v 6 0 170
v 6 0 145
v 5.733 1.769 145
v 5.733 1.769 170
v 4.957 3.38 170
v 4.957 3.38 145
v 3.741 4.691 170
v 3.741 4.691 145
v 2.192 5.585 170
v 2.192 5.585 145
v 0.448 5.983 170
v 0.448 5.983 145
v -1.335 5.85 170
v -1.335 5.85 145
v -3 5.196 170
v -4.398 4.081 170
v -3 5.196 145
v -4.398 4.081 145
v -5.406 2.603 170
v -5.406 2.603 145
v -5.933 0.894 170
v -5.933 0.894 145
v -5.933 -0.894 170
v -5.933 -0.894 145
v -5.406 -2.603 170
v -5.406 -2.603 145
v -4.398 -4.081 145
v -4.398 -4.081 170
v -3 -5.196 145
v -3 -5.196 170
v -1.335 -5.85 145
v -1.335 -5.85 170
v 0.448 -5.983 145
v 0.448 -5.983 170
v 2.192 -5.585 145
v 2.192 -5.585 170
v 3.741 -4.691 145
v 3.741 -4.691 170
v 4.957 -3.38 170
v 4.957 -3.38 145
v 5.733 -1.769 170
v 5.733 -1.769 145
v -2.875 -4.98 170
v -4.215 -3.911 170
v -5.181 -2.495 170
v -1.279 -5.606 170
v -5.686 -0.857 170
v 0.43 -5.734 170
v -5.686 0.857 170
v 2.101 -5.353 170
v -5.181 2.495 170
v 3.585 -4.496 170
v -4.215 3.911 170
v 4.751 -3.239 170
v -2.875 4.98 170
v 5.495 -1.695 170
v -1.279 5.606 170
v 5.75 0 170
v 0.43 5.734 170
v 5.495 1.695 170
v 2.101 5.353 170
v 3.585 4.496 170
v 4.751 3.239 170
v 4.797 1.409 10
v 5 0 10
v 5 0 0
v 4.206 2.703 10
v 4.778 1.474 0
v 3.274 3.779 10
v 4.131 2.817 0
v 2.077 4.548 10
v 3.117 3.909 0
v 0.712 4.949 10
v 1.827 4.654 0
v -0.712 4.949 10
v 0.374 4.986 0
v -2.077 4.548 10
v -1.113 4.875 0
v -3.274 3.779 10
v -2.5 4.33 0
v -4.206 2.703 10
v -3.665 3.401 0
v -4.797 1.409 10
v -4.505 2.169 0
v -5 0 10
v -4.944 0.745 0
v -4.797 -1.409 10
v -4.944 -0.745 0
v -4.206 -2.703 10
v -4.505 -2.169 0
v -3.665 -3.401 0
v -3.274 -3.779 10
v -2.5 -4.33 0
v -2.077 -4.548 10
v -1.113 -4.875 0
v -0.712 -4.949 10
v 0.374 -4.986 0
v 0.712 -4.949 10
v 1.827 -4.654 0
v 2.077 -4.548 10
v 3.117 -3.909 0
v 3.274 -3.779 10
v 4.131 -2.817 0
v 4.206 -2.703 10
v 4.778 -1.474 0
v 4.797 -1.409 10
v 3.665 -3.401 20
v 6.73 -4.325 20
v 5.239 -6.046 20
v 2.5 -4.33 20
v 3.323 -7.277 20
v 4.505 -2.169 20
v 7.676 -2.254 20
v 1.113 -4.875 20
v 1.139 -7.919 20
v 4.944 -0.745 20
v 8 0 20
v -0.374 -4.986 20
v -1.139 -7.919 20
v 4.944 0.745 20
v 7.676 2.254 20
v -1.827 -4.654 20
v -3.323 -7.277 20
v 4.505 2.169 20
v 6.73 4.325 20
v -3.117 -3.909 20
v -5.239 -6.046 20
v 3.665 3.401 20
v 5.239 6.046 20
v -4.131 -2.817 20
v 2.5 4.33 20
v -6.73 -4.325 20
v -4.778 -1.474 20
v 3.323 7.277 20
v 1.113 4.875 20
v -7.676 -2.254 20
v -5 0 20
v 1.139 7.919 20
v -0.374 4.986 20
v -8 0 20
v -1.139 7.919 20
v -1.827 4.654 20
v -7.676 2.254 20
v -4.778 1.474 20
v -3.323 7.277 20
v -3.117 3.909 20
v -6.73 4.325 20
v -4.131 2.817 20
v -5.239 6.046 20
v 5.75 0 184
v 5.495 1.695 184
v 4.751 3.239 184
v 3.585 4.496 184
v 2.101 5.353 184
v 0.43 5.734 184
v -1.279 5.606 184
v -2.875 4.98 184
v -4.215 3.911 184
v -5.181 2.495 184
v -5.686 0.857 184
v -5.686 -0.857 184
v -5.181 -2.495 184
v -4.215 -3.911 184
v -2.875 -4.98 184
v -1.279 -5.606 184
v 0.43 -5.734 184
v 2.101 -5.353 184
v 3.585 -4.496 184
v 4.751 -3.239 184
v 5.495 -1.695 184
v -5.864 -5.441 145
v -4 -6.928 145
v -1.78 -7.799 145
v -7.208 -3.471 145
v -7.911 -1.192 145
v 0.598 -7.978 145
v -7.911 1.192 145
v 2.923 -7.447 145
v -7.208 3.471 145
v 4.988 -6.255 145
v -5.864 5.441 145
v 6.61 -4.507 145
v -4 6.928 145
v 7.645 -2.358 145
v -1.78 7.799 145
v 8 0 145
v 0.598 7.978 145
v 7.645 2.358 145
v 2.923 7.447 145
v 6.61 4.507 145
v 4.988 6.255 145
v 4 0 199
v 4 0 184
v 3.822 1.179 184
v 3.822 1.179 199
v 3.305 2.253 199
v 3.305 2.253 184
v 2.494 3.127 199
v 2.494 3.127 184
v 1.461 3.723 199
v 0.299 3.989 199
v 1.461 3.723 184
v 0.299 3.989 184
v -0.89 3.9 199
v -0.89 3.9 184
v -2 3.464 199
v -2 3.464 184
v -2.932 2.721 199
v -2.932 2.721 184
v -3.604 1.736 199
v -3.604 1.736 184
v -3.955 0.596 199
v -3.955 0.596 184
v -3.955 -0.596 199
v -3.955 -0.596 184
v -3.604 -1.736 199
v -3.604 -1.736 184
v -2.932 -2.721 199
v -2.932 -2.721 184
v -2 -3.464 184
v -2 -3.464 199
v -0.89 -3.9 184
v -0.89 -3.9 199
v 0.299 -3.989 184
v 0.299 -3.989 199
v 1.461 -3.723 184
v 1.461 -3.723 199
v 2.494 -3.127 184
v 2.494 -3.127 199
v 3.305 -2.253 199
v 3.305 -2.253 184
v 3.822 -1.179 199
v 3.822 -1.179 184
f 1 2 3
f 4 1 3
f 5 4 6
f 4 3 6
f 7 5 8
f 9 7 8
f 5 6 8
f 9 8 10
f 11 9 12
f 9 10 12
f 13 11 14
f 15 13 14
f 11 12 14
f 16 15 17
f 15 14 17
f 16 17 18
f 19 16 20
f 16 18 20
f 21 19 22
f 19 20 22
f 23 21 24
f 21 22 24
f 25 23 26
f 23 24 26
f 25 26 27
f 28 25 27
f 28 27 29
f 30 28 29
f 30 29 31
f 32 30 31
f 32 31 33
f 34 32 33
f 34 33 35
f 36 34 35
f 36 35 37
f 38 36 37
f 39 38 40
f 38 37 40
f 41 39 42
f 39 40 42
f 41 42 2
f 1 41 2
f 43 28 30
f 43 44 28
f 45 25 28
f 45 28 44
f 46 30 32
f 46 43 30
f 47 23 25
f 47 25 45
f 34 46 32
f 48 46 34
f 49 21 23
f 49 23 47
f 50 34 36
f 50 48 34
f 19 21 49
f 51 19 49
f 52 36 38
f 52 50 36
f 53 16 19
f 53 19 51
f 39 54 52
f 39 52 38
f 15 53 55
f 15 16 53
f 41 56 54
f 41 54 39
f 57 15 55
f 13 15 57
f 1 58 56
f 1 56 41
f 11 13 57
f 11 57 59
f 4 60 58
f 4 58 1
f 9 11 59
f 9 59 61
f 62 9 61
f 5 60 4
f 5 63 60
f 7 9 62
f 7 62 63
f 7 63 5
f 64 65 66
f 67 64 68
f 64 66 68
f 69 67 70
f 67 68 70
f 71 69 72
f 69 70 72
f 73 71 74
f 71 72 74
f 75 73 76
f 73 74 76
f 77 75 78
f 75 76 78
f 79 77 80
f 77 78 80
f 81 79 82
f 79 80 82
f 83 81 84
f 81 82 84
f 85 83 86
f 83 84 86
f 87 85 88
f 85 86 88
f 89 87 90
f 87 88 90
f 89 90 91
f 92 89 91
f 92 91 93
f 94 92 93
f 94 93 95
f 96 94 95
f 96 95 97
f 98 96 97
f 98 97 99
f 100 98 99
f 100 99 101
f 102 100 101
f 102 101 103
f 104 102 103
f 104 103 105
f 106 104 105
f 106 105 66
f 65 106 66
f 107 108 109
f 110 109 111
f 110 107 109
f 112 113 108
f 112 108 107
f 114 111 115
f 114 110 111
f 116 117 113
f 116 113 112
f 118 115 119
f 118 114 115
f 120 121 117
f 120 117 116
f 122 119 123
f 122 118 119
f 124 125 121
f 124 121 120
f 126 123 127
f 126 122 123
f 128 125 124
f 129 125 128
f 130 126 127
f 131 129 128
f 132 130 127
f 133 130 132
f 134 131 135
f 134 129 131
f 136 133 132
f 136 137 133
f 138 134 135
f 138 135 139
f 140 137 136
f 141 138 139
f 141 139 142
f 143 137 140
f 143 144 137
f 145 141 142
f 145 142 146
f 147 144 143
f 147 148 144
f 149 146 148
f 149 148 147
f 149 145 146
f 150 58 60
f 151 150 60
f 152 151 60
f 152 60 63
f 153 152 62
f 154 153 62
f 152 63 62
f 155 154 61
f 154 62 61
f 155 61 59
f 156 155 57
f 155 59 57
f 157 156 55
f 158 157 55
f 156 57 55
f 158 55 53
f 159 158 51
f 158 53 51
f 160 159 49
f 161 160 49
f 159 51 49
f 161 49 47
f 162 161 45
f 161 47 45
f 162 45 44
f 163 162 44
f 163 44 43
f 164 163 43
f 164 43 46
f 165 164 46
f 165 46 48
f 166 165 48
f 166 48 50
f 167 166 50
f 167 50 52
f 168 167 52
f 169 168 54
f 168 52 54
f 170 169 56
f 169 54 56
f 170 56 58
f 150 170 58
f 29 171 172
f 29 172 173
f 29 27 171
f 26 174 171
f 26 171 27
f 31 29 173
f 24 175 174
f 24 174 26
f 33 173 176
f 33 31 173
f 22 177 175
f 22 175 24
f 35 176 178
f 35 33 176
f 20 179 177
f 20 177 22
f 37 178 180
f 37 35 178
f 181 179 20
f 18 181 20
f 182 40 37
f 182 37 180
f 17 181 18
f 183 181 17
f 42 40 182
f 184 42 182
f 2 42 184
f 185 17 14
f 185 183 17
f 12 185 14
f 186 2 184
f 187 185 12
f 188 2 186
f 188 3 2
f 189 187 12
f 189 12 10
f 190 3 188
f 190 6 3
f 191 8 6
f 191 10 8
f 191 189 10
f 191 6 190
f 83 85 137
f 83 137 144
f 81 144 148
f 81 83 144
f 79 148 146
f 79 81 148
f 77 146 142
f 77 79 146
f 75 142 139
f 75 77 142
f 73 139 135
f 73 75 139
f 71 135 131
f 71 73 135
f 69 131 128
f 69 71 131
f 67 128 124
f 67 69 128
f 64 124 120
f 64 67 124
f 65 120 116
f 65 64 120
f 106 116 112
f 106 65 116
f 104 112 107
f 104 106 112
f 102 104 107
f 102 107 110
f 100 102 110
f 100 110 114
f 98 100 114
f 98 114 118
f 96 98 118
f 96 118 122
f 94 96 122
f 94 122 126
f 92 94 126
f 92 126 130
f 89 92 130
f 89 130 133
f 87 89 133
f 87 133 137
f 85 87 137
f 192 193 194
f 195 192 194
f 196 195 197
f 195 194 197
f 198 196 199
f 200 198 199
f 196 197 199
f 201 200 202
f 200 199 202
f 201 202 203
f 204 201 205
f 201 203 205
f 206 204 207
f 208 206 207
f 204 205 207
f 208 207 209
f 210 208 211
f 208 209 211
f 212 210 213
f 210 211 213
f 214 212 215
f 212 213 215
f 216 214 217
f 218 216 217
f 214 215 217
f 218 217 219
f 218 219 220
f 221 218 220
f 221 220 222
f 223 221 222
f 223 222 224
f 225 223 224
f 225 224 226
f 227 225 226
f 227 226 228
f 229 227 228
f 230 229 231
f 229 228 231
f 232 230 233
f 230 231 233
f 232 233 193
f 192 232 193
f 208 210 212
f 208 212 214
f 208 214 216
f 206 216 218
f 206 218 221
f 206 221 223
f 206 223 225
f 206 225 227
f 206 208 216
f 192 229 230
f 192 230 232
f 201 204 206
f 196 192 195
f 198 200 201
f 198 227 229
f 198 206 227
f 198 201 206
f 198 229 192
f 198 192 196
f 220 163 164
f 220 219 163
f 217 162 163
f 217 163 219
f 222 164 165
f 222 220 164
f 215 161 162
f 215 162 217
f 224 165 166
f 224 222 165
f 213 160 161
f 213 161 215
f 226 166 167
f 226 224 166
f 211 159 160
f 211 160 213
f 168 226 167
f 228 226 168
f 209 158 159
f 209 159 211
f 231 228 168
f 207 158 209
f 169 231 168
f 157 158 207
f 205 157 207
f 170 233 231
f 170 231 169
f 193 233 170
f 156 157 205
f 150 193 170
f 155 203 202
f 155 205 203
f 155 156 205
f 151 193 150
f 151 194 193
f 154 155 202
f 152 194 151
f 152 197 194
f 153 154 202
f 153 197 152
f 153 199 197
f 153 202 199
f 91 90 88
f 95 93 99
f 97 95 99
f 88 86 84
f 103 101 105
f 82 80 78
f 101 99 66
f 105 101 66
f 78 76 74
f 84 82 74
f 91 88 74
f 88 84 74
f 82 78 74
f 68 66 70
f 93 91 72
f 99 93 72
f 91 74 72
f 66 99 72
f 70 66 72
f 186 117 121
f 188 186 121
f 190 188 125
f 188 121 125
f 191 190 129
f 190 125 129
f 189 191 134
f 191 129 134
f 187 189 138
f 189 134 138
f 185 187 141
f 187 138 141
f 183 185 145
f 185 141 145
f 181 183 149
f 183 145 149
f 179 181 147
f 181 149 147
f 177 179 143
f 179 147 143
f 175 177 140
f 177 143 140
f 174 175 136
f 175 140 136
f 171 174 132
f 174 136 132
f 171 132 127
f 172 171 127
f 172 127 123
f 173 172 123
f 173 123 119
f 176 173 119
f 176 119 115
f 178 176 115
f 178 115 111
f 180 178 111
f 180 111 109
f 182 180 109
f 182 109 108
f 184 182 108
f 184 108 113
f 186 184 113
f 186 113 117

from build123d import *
from build123d.topology import SkipClean

# Parameters (mm, degrees)
SKETCH_1_R          = 5
EXTRUDE_1_DEPTH     = 10
SKETCH_2_R          = 8
EXTRUDE_2_DEPTH     = 135
SKETCH_3_R          = 6
EXTRUDE_3_DEPTH     = 25
SKETCH_4_R          = 5.75
EXTRUDE_4_DEPTH     = 14
SKETCH_5_R          = 4
EXTRUDE_5_DEPTH     = 15
SKETCH_6_R          = 8
SKETCH_6_R_2        = 5
CUT_EXTRUDE_1_DEPTH = 10


with BuildPart() as part:
    # 스케치1 → 보스-돌출1 (new body)
    with BuildSketch(Plane.XY):
        Circle(SKETCH_1_R)
    extrude(amount=EXTRUDE_1_DEPTH)

    # 스케치2 → 보스-돌출2 (add)
    with BuildSketch(Plane.XY.offset(10)):
        Circle(SKETCH_2_R)
    extrude(amount=EXTRUDE_2_DEPTH)

    # 스케치3 → 보스-돌출3 (add)
    with BuildSketch(Plane.XY.offset(145)):
        Circle(SKETCH_3_R)
    extrude(amount=EXTRUDE_3_DEPTH)

    # 스케치4 → 보스-돌출4 (add)
    with BuildSketch(Plane.XY.offset(170)):
        Circle(SKETCH_4_R)
    extrude(amount=EXTRUDE_4_DEPTH)

    # 스케치5 → 보스-돌출5 (add)
    with BuildSketch(Plane.XY.offset(184)):
        Circle(SKETCH_5_R)
    extrude(amount=EXTRUDE_5_DEPTH)

    # 스케치6 → 컷-돌출1 (cut)
    with SkipClean():  # the faces are left unmerged after this step: merging them gives an invalid solid
        with BuildSketch(Plane(origin=(0, 0, 10), x_dir=(-1, 0, 0), z_dir=(0, 0, -1))):
            Circle(SKETCH_6_R)
            Circle(SKETCH_6_R_2, mode=Mode.SUBTRACT)
        extrude(amount=-CUT_EXTRUDE_1_DEPTH, mode=Mode.SUBTRACT)


solid = part.part
